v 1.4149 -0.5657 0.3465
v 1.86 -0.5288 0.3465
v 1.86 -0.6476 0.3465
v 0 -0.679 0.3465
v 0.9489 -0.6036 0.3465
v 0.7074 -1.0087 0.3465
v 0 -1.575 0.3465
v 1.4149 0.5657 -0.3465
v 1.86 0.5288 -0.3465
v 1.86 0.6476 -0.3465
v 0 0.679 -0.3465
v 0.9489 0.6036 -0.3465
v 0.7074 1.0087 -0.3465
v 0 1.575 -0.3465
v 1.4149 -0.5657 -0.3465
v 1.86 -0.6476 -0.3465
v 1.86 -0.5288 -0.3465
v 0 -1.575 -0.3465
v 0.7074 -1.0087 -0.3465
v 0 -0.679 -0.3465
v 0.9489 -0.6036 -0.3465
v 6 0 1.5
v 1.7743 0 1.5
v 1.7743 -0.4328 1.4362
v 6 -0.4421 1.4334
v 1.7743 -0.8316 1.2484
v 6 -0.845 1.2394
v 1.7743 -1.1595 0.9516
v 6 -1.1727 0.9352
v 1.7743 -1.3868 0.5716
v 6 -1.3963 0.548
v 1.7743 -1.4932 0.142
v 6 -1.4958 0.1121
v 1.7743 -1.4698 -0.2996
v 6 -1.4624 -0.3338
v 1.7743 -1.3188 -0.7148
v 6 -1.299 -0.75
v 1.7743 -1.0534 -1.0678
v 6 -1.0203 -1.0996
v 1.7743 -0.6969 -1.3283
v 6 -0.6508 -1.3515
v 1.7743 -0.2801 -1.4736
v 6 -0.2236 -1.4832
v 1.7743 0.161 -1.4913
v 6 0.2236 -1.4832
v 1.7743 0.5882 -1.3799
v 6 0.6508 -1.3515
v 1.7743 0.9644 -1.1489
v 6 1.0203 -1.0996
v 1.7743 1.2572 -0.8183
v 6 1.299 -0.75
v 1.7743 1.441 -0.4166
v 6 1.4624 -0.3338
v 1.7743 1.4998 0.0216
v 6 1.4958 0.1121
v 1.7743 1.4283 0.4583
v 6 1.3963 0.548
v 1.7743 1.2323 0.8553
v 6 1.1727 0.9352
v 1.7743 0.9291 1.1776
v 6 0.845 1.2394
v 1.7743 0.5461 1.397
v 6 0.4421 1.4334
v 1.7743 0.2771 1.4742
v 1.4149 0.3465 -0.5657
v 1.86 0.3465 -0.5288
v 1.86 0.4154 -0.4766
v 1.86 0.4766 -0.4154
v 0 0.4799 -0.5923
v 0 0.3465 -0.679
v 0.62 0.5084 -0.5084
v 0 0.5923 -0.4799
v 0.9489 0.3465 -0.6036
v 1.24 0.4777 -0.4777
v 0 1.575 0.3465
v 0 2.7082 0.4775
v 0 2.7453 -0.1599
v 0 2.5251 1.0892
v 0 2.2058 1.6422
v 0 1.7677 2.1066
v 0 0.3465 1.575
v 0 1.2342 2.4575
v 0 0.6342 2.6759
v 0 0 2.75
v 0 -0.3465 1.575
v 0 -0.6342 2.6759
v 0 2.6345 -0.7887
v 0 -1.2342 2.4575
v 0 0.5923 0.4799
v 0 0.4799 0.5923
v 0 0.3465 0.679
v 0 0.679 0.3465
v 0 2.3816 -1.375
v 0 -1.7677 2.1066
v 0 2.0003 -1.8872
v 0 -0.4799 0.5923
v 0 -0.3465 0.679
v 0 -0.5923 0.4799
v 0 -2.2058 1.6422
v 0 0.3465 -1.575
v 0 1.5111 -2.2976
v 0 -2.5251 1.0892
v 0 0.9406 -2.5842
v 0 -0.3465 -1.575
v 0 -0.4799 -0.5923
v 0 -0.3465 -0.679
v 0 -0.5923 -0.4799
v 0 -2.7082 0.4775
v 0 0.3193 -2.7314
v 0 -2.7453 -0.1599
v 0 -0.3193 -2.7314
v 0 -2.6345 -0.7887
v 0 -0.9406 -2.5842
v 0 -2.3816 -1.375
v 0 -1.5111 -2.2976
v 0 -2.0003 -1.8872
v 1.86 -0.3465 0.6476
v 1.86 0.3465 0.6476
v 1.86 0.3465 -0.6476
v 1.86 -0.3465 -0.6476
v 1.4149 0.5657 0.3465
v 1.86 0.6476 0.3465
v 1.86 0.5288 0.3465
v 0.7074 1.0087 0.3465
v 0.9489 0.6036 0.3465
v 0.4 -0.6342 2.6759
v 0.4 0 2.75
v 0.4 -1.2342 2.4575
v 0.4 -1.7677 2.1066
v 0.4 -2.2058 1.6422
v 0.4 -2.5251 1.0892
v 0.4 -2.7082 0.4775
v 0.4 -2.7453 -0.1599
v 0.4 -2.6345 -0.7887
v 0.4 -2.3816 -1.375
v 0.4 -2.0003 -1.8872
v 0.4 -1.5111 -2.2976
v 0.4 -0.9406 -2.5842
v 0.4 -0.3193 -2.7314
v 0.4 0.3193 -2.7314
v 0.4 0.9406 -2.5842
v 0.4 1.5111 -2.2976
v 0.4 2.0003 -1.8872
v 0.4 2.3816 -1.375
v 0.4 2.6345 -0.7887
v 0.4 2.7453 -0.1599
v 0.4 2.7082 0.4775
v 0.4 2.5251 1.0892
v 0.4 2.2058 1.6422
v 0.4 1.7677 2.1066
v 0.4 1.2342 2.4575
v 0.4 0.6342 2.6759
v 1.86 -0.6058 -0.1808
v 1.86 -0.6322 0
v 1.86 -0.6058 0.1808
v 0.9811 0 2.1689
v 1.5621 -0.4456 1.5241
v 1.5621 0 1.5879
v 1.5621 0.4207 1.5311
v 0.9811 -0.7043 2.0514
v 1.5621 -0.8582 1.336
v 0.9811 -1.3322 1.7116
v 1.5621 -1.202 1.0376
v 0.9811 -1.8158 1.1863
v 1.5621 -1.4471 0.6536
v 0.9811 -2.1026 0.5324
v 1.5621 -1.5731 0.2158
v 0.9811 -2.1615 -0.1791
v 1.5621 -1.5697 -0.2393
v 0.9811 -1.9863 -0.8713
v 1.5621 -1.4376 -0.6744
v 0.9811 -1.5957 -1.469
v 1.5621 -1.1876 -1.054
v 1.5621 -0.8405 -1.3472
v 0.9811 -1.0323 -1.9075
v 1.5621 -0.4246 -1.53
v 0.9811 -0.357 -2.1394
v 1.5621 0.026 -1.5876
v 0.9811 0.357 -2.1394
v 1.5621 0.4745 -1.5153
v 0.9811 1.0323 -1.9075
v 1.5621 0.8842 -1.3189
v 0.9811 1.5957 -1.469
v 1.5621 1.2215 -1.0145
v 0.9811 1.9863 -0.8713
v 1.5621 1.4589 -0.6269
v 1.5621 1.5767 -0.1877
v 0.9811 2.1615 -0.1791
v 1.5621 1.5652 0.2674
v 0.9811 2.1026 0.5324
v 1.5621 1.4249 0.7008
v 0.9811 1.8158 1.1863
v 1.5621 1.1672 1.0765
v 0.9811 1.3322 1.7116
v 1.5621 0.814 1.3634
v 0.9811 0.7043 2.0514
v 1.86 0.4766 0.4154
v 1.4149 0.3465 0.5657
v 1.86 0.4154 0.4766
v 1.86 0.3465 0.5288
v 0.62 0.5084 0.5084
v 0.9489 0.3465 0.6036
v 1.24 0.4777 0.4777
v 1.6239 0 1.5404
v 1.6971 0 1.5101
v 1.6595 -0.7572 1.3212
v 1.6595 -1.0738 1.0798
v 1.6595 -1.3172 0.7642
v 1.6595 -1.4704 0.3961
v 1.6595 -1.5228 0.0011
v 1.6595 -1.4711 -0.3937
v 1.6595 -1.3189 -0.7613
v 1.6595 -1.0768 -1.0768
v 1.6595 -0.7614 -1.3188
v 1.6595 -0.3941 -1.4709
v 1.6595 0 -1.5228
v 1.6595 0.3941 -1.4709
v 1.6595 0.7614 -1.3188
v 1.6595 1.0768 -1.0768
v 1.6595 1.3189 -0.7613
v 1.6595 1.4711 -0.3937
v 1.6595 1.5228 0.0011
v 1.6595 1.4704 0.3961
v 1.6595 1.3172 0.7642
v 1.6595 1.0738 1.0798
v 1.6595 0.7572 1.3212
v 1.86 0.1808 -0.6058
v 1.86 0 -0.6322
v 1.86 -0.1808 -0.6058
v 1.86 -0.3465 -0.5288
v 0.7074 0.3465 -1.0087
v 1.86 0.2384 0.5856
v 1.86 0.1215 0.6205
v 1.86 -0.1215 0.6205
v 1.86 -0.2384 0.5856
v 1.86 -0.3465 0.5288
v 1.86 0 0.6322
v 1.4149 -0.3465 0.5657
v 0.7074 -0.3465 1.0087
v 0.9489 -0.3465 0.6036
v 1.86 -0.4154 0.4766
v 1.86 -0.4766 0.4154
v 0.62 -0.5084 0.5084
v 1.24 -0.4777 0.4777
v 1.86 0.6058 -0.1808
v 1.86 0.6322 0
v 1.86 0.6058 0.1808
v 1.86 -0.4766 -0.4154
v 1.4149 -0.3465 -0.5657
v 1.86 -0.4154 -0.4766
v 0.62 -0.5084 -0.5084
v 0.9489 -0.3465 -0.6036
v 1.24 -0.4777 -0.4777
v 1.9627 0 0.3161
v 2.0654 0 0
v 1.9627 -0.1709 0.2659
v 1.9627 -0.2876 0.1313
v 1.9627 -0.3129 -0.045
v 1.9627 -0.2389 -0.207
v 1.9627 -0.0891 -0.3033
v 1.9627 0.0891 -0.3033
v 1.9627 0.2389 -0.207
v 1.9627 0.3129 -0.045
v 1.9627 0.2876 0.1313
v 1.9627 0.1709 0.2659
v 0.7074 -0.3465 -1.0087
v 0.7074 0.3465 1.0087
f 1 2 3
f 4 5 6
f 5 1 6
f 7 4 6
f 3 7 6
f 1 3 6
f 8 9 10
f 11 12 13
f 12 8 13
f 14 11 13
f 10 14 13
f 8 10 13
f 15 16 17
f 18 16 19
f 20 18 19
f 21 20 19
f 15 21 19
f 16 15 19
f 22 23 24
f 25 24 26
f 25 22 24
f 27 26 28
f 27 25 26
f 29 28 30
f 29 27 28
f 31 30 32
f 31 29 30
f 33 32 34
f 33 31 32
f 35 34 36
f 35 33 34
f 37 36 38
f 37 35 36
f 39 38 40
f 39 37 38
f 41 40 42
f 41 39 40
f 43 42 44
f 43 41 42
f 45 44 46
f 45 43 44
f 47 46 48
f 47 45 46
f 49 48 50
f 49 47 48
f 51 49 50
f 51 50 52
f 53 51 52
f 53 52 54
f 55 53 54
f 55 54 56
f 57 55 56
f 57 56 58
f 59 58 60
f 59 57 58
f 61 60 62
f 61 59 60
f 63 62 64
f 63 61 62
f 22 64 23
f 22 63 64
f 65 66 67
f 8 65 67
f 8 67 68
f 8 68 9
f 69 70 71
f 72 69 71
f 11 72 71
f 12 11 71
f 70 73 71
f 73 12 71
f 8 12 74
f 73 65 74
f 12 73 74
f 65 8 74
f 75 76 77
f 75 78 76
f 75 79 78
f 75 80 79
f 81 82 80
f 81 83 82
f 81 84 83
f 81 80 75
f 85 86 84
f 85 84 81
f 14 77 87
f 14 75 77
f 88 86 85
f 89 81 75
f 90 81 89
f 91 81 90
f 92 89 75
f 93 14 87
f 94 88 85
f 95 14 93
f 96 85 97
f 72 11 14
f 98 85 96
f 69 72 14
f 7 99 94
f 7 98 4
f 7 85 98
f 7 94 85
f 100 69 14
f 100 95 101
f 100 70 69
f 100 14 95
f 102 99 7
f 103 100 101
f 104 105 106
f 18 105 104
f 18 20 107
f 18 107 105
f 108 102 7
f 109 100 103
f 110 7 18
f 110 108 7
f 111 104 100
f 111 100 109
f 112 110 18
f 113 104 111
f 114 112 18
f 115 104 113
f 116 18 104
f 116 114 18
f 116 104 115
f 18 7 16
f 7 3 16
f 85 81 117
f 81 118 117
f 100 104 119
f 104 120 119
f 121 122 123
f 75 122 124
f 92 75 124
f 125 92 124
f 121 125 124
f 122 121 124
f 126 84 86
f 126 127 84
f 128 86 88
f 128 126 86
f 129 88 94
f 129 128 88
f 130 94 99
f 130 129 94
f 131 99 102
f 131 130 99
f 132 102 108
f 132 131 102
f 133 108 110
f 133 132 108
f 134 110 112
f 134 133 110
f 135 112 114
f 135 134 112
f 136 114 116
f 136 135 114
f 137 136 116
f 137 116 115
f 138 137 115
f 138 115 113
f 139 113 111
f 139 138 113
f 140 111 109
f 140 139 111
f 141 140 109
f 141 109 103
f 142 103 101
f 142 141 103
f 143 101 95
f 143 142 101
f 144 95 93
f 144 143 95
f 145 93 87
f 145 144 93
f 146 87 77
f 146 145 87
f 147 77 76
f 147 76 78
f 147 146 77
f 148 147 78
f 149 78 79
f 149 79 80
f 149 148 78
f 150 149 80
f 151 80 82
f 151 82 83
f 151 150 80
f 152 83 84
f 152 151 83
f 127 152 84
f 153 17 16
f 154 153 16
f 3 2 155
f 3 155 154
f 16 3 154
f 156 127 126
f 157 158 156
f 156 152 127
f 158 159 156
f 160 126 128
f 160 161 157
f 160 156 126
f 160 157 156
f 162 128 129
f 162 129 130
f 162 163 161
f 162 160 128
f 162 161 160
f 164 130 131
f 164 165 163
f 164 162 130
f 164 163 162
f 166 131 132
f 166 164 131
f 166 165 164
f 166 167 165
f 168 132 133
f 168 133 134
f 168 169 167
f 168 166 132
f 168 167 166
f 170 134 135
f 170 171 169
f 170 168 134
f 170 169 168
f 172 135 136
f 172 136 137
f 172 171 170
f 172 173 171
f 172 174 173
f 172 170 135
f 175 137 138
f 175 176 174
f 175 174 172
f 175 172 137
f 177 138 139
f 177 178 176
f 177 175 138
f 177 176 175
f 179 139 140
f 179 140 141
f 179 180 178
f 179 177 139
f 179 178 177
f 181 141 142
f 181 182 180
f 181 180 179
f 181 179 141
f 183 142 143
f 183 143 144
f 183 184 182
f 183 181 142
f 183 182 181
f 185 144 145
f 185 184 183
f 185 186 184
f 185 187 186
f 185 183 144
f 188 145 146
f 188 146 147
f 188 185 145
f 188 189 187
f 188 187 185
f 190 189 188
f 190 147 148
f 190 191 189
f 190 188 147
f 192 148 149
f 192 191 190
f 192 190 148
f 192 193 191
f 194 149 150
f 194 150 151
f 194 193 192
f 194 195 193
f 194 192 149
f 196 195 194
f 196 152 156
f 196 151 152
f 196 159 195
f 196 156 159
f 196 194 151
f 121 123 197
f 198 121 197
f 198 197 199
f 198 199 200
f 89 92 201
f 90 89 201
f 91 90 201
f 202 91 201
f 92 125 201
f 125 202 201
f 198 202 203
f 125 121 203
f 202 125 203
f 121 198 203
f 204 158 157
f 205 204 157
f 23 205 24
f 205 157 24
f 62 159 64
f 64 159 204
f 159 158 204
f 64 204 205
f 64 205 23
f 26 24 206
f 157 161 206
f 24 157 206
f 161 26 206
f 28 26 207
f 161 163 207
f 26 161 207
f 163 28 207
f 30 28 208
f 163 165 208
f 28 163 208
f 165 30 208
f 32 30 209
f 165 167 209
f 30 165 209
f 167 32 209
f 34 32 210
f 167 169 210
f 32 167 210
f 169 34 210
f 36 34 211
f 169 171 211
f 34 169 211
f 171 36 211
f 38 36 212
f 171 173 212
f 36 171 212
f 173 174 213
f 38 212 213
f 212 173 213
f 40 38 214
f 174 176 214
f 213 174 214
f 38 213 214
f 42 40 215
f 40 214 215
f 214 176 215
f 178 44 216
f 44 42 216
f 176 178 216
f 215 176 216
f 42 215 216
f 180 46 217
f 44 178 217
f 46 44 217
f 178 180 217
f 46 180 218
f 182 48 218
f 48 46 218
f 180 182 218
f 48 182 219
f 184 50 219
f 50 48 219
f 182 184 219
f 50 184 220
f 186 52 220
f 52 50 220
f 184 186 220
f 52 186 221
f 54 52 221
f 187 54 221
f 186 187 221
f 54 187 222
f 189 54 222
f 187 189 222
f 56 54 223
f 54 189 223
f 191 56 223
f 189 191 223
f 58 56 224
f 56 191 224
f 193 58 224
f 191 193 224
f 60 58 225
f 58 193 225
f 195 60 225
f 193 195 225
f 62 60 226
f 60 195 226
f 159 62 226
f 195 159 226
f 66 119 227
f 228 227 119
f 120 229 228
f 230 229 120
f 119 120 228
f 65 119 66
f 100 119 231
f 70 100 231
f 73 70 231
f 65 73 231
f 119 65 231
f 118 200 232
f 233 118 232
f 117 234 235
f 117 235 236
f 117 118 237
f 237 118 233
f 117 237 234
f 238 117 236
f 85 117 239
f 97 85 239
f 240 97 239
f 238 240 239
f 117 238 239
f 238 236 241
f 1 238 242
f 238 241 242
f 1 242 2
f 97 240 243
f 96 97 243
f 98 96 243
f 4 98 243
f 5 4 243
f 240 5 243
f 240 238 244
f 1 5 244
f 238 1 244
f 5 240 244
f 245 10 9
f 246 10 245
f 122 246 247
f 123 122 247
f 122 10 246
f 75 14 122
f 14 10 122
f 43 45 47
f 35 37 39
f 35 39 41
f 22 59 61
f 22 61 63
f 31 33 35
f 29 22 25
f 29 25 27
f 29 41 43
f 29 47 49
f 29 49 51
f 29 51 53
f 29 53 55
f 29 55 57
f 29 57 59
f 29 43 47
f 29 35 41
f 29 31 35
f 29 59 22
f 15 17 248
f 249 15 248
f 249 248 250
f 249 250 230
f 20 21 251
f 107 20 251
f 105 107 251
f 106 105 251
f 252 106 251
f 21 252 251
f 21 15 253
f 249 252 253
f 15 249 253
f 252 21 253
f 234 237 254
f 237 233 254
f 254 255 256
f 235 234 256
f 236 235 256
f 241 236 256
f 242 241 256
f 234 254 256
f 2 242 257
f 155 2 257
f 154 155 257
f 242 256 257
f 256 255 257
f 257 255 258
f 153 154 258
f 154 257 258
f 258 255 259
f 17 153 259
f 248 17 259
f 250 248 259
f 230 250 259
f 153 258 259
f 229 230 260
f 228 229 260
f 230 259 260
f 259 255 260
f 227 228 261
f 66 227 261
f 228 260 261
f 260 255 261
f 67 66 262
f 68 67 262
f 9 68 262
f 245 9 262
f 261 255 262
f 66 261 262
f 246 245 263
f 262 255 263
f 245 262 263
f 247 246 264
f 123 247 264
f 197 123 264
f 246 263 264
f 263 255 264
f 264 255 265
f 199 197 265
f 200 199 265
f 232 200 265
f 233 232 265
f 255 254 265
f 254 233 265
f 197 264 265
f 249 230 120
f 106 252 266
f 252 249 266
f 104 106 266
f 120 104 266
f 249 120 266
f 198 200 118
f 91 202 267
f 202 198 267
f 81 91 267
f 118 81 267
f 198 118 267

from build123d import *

# Parameters (mm, degrees)
FILLET1_R    = 0.3
RECPAT_COUNT = 2
RECPAT_ANGLE = 90


with BuildPart() as part:
    # BodySke → BaseBody (revolve)
    with BuildSketch(Plane.XY, mode=Mode.PRIVATE) as basebody_sk:
        Polygon((0, 0), (0, 2.75), (0.4, 2.75), (1.65, 1.5), (6, 1.5), (6, 0), align=None)
    revolve(basebody_sk.sketch.rotate(Axis((0, 0, 0), (1, 0, 0)), 90), axis=Axis((0, 0, 0), (1, 0, 0)))

    # Fillet1
    fillet1_edges = [part.edges().sort_by_distance(p)[0] for p in [
        (1.65, 0, -1.5),
    ]]
    fillet(fillet1_edges, radius=FILLET1_R)

    # RecSkeTop → Recess section 0
    with BuildSketch(Plane.ZY):
        with BuildLine():
            Line((-0.3465, 1.575), (0.3465, 1.575))
            Line((0.3465, 1.575), (0.3465, -1.575))
            Line((0.3465, -1.575), (-0.3465, -1.575))
            Line((-0.3465, -1.575), (-0.3465, 1.575))
        make_face()
    # RecSkeBot → Recess section 1
    with BuildSketch(Plane(origin=(1.86, 0, 0), x_dir=(0, 0, -1), z_dir=(1, 0, 0))):
        with BuildLine():
            Line((0.3465, 0.647638364), (-0.3465, 0.647638364))
            Line((-0.3465, 0.647638364), (-0.3465, -0.647638364))
            Line((-0.3465, -0.647638364), (0.3465, -0.647638364))
            Line((0.3465, -0.647638364), (0.3465, 0.647638364))
        make_face()
    recess = loft(mode=Mode.SUBTRACT)

    # RecPat: Recess ×2 about axis
    recpat_axis = Axis((0, 0, 0), (1, 0, 0))
    for i in range(1, RECPAT_COUNT):
        add(recess.rotate(recpat_axis, i * RECPAT_ANGLE / (RECPAT_COUNT - 1)), mode=Mode.SUBTRACT)

    # RecCorSke → RecessCore (revolve, cut)
    with BuildSketch(Plane.XY, mode=Mode.PRIVATE) as recesscore_sk:
        Polygon((0, 0), (0, 0.7623), (1.86, 0.63223613), (2.065425971, 0), align=None)
    revolve(recesscore_sk.sketch.rotate(Axis((0, 0, 0), (1, 0, 0)), 90), axis=Axis((0, 0, 0), (1, 0, 0)), mode=Mode.SUBTRACT)


solid = part.part
